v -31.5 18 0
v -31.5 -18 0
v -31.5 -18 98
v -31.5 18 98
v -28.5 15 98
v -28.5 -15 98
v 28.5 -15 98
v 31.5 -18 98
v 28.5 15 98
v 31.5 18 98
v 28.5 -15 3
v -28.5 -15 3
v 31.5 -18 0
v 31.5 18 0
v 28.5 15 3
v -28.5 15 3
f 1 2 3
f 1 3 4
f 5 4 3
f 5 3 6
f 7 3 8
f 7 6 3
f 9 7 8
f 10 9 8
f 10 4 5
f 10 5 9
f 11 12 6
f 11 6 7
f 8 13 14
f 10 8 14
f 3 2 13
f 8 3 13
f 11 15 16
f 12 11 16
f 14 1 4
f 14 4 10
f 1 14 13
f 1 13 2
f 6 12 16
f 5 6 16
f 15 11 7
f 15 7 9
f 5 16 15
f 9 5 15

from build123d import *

# Parameters (mm, degrees)
SKETCH1_W           = 63
SKETCH1_H           = 36
SKETCH1_W_2         = 57
SKETCH1_H_2         = 30
BOSS_EXTRUDE1_DEPTH = 98
SKETCH2_W           = 57
SKETCH2_H           = 30
BOSS_EXTRUDE2_DEPTH = 3


with BuildPart() as part:
    # Sketch1 → Boss-Extrude1 (new body)
    with BuildSketch(Plane.XY):
        Rectangle(SKETCH1_W, SKETCH1_H)
        Rectangle(SKETCH1_W_2, SKETCH1_H_2, mode=Mode.SUBTRACT)
    extrude(amount=BOSS_EXTRUDE1_DEPTH)

    # Sketch2 → Boss-Extrude2 (add)
    with BuildSketch(Plane(origin=(0, 0, 0), x_dir=(-1, 0, 0), z_dir=(0, 0, -1))):
        Rectangle(SKETCH2_W, SKETCH2_H)
    extrude(amount=-BOSS_EXTRUDE2_DEPTH)


solid = part.part
